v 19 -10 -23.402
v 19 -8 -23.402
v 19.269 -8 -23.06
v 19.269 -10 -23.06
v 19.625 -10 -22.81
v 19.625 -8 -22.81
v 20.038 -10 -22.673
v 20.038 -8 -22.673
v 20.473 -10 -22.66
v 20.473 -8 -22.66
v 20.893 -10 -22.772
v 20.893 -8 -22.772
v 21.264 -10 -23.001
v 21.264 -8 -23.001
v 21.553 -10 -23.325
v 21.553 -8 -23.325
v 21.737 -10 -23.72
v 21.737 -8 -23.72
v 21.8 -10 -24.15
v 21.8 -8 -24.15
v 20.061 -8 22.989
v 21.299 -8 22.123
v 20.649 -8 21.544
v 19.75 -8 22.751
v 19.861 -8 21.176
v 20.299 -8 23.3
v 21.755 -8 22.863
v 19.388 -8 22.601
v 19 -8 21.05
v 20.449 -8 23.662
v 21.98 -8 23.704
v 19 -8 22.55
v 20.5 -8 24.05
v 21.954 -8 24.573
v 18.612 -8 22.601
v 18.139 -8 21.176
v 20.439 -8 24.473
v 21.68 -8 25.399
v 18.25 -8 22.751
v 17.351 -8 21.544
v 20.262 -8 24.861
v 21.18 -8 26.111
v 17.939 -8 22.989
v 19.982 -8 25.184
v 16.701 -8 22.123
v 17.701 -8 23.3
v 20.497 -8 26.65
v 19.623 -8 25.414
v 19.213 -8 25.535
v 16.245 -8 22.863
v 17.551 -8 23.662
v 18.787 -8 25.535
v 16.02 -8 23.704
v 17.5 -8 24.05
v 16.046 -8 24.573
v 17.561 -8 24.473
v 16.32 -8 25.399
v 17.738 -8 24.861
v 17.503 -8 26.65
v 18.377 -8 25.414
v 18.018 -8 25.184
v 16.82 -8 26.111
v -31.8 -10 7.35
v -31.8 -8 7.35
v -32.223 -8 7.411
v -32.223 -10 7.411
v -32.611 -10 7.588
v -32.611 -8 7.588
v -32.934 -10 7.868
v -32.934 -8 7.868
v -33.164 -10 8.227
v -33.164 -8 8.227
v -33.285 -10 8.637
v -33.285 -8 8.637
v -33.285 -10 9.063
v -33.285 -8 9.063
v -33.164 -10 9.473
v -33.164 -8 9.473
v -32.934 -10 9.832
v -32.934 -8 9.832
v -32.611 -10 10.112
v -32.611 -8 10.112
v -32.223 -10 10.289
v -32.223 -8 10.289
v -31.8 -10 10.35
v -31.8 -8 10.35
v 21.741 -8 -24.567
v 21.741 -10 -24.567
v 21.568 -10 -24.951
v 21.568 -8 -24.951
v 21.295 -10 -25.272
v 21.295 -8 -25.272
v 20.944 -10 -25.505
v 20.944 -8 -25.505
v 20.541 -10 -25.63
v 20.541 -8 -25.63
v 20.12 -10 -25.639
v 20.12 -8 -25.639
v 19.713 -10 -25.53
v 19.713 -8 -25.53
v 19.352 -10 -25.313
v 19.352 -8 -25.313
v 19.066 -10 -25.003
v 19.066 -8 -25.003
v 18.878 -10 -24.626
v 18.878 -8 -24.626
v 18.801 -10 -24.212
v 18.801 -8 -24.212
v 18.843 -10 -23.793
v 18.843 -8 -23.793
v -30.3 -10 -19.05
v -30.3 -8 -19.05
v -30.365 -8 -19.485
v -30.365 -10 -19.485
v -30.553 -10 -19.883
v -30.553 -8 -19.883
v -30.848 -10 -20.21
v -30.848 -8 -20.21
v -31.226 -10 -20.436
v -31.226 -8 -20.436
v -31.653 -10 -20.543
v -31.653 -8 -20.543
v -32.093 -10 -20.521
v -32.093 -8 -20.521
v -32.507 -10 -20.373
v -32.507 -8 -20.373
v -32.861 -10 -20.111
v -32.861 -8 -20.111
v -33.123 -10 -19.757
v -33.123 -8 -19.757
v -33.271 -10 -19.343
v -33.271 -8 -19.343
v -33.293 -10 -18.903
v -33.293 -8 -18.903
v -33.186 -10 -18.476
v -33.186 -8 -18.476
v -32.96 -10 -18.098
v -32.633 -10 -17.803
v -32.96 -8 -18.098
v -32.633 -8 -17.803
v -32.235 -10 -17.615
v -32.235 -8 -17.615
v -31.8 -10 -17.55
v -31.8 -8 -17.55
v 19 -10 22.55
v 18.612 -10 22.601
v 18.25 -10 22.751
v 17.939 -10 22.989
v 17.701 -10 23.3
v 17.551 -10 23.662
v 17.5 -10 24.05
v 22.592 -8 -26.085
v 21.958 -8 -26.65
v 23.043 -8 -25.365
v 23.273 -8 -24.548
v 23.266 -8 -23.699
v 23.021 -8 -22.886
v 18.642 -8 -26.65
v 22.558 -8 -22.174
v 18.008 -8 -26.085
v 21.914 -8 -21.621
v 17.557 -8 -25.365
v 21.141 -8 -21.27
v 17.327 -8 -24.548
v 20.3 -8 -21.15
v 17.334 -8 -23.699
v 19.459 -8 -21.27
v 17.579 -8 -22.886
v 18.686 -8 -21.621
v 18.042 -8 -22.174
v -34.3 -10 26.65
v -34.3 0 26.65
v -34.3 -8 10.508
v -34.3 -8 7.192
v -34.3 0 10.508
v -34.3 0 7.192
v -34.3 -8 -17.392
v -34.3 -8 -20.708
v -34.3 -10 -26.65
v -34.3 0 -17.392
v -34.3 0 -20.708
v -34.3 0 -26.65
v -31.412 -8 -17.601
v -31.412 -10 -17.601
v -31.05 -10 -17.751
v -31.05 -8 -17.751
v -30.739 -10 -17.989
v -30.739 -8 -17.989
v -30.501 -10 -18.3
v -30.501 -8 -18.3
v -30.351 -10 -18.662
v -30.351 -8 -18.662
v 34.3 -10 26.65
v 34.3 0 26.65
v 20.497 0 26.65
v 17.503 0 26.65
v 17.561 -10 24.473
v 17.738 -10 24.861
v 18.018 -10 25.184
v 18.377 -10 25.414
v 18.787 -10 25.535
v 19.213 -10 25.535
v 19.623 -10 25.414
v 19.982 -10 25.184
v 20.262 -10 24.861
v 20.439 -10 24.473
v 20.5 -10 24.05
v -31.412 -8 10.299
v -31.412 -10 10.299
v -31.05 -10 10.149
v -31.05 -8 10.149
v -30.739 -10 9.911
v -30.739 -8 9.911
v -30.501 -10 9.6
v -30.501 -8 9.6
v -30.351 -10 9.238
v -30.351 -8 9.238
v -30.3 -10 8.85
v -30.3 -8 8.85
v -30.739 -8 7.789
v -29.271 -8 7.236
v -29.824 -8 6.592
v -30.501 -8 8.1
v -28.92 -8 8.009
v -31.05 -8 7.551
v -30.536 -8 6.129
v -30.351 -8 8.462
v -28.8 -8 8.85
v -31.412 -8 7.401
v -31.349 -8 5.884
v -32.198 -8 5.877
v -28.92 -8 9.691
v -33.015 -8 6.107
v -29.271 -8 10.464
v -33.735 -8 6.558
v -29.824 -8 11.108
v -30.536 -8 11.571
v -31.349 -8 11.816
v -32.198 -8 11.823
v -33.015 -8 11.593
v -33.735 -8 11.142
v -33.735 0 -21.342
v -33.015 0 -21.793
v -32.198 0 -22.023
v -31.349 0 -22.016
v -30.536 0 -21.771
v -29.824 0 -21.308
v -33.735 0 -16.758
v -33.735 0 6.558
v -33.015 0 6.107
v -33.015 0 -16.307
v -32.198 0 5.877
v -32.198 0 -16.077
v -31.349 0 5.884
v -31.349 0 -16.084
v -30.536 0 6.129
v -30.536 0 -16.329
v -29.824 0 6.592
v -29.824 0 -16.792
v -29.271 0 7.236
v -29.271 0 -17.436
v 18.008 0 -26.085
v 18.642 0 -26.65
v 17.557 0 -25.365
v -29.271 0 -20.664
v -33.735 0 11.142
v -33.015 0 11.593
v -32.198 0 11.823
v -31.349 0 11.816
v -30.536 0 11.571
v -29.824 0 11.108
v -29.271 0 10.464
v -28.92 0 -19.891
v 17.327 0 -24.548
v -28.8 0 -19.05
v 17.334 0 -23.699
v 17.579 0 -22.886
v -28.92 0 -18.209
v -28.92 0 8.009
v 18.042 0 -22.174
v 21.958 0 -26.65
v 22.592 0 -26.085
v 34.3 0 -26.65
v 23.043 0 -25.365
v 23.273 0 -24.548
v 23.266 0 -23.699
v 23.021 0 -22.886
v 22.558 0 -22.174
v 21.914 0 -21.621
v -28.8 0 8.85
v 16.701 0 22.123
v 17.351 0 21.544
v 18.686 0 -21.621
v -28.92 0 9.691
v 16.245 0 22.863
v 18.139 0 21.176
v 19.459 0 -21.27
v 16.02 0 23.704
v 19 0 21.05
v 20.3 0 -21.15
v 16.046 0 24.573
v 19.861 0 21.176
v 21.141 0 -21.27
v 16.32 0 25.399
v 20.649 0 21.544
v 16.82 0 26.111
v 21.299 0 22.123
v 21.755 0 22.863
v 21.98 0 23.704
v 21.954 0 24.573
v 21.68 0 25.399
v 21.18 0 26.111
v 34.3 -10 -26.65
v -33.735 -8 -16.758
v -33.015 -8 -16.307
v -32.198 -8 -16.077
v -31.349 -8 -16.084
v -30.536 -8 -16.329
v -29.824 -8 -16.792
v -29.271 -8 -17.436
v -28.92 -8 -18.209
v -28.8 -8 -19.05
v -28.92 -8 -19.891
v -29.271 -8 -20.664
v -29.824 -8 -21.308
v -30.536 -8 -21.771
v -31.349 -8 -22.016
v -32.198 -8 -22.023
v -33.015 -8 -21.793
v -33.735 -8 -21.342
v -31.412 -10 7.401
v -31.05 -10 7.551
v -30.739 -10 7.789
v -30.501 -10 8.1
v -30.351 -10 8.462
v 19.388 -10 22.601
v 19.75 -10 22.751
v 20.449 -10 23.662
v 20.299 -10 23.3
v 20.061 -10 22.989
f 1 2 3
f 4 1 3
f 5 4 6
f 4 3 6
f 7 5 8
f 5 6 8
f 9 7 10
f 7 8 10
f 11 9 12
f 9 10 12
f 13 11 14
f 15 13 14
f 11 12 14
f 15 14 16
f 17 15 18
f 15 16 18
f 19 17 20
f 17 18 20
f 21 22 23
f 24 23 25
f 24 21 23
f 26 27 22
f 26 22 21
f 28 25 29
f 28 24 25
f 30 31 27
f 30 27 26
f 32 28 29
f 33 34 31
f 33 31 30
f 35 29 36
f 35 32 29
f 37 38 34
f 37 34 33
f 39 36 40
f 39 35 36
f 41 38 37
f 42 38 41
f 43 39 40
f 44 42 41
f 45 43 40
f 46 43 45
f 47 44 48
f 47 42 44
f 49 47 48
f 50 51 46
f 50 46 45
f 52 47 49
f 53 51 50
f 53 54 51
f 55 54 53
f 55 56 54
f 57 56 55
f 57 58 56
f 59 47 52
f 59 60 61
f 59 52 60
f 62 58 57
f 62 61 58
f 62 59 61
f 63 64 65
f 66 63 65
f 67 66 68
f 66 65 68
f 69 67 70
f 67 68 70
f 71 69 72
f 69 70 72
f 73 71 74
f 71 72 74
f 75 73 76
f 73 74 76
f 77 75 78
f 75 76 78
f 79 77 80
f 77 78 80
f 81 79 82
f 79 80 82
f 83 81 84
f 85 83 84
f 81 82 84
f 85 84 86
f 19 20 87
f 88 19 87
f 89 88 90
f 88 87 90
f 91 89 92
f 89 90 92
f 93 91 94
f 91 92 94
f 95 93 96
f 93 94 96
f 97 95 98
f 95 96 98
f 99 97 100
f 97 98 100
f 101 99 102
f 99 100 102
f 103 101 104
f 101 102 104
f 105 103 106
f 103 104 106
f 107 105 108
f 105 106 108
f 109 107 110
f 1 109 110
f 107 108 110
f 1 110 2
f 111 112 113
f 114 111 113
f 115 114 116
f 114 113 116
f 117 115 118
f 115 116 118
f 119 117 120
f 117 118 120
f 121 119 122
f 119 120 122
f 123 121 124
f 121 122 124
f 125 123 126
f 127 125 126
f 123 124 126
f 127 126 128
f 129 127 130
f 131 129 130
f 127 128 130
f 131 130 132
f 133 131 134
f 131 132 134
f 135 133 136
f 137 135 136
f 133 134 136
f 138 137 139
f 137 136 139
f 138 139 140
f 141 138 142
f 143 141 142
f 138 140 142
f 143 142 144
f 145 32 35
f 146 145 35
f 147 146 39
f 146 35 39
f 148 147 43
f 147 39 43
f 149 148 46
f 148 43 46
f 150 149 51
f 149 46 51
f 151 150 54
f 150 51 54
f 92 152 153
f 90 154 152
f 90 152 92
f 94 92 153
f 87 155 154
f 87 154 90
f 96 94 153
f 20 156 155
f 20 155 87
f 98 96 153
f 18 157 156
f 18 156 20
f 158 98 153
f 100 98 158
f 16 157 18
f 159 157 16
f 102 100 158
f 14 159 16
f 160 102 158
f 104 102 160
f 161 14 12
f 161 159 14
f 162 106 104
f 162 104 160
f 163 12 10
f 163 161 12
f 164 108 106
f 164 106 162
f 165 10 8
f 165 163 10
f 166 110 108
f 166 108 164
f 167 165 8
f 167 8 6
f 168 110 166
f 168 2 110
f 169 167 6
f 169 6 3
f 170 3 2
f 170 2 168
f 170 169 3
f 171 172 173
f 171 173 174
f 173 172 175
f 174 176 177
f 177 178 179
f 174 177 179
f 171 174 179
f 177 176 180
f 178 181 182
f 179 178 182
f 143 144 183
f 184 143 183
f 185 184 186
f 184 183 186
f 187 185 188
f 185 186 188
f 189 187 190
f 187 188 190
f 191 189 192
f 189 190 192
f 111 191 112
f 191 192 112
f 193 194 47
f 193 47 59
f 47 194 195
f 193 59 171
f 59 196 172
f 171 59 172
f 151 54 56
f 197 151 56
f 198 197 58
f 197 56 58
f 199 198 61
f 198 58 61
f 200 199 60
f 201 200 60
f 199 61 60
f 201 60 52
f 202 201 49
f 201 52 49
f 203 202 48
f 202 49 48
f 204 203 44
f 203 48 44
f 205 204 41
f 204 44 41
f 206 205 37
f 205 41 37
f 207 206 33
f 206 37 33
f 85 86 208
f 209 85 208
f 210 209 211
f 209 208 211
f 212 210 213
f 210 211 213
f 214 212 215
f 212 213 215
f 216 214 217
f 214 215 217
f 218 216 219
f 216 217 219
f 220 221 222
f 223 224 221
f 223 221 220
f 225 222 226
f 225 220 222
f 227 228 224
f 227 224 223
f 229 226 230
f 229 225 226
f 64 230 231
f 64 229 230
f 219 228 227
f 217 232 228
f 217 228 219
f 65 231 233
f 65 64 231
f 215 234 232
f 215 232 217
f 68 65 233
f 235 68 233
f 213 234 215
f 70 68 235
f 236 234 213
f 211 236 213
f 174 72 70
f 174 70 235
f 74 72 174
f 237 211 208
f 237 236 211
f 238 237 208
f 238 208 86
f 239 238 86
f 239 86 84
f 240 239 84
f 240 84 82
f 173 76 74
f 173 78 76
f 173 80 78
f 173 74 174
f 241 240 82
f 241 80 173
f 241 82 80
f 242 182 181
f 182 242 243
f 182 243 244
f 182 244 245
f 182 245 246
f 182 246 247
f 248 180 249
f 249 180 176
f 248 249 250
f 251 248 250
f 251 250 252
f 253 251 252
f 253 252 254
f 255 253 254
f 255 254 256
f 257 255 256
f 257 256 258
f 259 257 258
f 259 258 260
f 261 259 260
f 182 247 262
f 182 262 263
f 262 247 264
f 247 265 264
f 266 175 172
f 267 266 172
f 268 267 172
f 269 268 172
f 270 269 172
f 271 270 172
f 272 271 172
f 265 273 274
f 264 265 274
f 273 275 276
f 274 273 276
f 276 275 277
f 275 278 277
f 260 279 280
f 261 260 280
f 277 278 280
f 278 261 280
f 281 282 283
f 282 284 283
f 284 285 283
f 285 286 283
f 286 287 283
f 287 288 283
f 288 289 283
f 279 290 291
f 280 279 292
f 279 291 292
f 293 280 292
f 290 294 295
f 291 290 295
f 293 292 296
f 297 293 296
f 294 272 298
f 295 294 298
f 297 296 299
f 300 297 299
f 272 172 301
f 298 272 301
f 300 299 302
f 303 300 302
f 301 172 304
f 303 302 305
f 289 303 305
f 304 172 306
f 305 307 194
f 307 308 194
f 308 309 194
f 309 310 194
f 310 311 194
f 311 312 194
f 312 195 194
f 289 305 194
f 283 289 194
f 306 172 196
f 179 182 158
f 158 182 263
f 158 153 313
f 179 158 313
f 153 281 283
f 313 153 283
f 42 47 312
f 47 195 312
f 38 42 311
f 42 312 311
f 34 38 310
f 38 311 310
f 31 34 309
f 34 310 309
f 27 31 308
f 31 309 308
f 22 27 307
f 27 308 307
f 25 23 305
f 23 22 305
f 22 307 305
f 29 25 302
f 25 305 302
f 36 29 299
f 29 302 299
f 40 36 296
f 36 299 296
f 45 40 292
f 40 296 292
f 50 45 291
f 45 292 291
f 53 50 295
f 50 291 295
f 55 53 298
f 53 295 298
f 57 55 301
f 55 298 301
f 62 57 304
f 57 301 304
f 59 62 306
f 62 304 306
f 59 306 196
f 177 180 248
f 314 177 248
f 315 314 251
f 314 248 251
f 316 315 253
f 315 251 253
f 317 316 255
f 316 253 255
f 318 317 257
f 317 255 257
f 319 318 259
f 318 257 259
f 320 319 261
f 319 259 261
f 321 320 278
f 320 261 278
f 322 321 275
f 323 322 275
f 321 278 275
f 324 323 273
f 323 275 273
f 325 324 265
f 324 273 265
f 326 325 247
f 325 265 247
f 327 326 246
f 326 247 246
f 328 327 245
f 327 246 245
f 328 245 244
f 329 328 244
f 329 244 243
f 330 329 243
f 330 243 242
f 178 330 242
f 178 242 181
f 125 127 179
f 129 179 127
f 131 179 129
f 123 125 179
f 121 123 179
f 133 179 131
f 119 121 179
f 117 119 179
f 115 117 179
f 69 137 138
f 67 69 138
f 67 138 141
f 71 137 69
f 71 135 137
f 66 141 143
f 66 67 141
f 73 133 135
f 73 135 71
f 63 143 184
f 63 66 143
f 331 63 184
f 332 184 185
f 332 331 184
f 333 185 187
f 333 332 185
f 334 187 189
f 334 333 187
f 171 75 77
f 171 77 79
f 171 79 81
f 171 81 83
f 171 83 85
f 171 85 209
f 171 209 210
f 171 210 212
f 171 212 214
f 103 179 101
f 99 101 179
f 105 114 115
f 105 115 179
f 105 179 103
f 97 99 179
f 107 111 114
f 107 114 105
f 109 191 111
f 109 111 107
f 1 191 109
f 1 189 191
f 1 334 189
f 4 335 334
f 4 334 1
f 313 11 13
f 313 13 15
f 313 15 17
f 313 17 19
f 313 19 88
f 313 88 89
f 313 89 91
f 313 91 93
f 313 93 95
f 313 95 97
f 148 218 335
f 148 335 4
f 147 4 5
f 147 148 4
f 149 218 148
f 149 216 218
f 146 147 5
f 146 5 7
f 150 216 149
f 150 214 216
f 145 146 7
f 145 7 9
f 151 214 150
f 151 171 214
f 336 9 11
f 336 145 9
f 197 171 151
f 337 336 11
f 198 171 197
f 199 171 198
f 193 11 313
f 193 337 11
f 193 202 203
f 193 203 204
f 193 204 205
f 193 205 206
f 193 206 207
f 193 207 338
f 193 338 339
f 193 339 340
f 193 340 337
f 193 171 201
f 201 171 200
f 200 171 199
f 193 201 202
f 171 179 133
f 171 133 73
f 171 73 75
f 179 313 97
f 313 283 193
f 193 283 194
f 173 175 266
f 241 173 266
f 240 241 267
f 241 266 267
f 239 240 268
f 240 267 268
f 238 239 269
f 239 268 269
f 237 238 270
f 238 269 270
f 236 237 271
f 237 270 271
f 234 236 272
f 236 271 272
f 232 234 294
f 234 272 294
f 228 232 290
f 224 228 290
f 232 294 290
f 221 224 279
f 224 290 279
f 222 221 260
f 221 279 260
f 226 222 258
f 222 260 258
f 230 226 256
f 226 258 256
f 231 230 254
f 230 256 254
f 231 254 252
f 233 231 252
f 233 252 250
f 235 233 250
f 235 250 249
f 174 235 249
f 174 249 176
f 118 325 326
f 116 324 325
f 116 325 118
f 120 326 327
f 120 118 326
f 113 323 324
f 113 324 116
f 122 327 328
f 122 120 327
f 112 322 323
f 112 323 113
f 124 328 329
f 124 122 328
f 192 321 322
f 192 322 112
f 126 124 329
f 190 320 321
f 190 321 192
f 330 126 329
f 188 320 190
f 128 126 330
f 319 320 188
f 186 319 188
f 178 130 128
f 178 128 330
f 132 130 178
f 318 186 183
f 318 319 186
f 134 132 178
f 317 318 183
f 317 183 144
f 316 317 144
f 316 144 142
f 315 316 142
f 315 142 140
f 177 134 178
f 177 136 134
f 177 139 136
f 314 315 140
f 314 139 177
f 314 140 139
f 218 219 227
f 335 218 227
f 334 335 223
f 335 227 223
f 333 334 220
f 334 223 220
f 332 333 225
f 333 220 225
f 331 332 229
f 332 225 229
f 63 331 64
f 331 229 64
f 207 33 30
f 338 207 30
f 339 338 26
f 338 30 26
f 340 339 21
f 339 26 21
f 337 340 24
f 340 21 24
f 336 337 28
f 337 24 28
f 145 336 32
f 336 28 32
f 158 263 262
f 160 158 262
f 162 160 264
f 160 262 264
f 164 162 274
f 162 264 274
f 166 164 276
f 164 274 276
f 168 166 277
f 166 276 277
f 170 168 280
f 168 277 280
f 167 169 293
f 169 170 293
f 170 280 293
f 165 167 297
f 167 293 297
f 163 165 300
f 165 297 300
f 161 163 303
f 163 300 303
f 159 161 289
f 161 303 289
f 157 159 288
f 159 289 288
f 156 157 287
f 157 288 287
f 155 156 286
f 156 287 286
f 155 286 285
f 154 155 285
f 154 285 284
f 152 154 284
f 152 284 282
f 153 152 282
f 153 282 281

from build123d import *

# Parameters (mm, degrees)
F1_DEPTH = 10
F2_R     = 3
F3_DEPTH = 8


with BuildPart() as f1:
    # F0 (on Front) → F1 (new body)
    with BuildSketch(Plane.XZ):
        with BuildLine():
            Line((34.3, 26.65), (-34.3, 26.65))
            Line((-34.3, 26.65), (-34.3, 24.05))
            Line((-34.3, 24.05), (-31.8, 24.05))
            Line((-31.8, 24.05), (17.5, 24.05))
            ThreePointArc((17.5, 24.05), (19, 25.55), (20.5, 24.05))
            ThreePointArc((20.5, 24.05), (20.06066, 22.98934), (19, 22.55))
            Line((19, 22.55), (19, -23.401669))
            ThreePointArc((19, -23.401669), (20.687298, -22.700862), (21.8, -24.15))
            Line((21.8, -24.15), (34.3, -24.15))
            Line((34.3, -24.15), (34.3, 26.65))
        make_face()
        with BuildLine():
            ThreePointArc((-30.3, -19.05), (-30.73934, -17.98934), (-31.8, -17.55))
            ThreePointArc((-31.8, -17.55), (-32.86066, -20.11066), (-30.3, -19.05))
        make_face()
        with BuildLine():
            Line((-31.8, 24.05), (-34.3, 24.05))
            Line((-34.3, 24.05), (-34.3, -26.65))
            Line((-34.3, -26.65), (34.3, -26.65))
            Line((34.3, -26.65), (34.3, -24.15))
            Line((34.3, -24.15), (21.8, -24.15))
            ThreePointArc((21.8, -24.15), (19.912702, -25.599138), (19, -23.401669))
            Line((19, -23.401669), (19, 22.55))
            ThreePointArc((19, 22.55), (17.93934, 22.98934), (17.5, 24.05))
            Line((17.5, 24.05), (-31.8, 24.05))
        make_face()
        with BuildLine():
            ThreePointArc((-30.3, -19.05), (-32.86066, -20.11066), (-31.8, -17.55))
            ThreePointArc((-31.8, -17.55), (-30.73934, -17.98934), (-30.3, -19.05))
        make_face(mode=Mode.SUBTRACT)
        with BuildLine():
            ThreePointArc((-31.8, 7.35), (-33.3, 8.85), (-31.8, 10.35))
            ThreePointArc((-31.8, 10.35), (-30.73934, 9.91066), (-30.3, 8.85))
            ThreePointArc((-30.3, 8.85), (-30.73934, 7.78934), (-31.8, 7.35))
        make_face(mode=Mode.SUBTRACT)
    extrude(amount=F1_DEPTH)

    # F2 (on face) → F3 (cut)
    with BuildSketch(Plane(origin=(0, 0, 0), x_dir=(-1, 0, 0), z_dir=(0, 1, 0))):
        with Locations((-19, 24.05)):
            Circle(F2_R)
        with Locations((31.8, 8.85)):
            Circle(F2_R)
        with Locations((31.8, -19.05)):
            Circle(F2_R)
        with Locations((-20.3, -24.15)):
            Circle(F2_R)
    extrude(amount=-F3_DEPTH, mode=Mode.SUBTRACT)


solid = f1.part
